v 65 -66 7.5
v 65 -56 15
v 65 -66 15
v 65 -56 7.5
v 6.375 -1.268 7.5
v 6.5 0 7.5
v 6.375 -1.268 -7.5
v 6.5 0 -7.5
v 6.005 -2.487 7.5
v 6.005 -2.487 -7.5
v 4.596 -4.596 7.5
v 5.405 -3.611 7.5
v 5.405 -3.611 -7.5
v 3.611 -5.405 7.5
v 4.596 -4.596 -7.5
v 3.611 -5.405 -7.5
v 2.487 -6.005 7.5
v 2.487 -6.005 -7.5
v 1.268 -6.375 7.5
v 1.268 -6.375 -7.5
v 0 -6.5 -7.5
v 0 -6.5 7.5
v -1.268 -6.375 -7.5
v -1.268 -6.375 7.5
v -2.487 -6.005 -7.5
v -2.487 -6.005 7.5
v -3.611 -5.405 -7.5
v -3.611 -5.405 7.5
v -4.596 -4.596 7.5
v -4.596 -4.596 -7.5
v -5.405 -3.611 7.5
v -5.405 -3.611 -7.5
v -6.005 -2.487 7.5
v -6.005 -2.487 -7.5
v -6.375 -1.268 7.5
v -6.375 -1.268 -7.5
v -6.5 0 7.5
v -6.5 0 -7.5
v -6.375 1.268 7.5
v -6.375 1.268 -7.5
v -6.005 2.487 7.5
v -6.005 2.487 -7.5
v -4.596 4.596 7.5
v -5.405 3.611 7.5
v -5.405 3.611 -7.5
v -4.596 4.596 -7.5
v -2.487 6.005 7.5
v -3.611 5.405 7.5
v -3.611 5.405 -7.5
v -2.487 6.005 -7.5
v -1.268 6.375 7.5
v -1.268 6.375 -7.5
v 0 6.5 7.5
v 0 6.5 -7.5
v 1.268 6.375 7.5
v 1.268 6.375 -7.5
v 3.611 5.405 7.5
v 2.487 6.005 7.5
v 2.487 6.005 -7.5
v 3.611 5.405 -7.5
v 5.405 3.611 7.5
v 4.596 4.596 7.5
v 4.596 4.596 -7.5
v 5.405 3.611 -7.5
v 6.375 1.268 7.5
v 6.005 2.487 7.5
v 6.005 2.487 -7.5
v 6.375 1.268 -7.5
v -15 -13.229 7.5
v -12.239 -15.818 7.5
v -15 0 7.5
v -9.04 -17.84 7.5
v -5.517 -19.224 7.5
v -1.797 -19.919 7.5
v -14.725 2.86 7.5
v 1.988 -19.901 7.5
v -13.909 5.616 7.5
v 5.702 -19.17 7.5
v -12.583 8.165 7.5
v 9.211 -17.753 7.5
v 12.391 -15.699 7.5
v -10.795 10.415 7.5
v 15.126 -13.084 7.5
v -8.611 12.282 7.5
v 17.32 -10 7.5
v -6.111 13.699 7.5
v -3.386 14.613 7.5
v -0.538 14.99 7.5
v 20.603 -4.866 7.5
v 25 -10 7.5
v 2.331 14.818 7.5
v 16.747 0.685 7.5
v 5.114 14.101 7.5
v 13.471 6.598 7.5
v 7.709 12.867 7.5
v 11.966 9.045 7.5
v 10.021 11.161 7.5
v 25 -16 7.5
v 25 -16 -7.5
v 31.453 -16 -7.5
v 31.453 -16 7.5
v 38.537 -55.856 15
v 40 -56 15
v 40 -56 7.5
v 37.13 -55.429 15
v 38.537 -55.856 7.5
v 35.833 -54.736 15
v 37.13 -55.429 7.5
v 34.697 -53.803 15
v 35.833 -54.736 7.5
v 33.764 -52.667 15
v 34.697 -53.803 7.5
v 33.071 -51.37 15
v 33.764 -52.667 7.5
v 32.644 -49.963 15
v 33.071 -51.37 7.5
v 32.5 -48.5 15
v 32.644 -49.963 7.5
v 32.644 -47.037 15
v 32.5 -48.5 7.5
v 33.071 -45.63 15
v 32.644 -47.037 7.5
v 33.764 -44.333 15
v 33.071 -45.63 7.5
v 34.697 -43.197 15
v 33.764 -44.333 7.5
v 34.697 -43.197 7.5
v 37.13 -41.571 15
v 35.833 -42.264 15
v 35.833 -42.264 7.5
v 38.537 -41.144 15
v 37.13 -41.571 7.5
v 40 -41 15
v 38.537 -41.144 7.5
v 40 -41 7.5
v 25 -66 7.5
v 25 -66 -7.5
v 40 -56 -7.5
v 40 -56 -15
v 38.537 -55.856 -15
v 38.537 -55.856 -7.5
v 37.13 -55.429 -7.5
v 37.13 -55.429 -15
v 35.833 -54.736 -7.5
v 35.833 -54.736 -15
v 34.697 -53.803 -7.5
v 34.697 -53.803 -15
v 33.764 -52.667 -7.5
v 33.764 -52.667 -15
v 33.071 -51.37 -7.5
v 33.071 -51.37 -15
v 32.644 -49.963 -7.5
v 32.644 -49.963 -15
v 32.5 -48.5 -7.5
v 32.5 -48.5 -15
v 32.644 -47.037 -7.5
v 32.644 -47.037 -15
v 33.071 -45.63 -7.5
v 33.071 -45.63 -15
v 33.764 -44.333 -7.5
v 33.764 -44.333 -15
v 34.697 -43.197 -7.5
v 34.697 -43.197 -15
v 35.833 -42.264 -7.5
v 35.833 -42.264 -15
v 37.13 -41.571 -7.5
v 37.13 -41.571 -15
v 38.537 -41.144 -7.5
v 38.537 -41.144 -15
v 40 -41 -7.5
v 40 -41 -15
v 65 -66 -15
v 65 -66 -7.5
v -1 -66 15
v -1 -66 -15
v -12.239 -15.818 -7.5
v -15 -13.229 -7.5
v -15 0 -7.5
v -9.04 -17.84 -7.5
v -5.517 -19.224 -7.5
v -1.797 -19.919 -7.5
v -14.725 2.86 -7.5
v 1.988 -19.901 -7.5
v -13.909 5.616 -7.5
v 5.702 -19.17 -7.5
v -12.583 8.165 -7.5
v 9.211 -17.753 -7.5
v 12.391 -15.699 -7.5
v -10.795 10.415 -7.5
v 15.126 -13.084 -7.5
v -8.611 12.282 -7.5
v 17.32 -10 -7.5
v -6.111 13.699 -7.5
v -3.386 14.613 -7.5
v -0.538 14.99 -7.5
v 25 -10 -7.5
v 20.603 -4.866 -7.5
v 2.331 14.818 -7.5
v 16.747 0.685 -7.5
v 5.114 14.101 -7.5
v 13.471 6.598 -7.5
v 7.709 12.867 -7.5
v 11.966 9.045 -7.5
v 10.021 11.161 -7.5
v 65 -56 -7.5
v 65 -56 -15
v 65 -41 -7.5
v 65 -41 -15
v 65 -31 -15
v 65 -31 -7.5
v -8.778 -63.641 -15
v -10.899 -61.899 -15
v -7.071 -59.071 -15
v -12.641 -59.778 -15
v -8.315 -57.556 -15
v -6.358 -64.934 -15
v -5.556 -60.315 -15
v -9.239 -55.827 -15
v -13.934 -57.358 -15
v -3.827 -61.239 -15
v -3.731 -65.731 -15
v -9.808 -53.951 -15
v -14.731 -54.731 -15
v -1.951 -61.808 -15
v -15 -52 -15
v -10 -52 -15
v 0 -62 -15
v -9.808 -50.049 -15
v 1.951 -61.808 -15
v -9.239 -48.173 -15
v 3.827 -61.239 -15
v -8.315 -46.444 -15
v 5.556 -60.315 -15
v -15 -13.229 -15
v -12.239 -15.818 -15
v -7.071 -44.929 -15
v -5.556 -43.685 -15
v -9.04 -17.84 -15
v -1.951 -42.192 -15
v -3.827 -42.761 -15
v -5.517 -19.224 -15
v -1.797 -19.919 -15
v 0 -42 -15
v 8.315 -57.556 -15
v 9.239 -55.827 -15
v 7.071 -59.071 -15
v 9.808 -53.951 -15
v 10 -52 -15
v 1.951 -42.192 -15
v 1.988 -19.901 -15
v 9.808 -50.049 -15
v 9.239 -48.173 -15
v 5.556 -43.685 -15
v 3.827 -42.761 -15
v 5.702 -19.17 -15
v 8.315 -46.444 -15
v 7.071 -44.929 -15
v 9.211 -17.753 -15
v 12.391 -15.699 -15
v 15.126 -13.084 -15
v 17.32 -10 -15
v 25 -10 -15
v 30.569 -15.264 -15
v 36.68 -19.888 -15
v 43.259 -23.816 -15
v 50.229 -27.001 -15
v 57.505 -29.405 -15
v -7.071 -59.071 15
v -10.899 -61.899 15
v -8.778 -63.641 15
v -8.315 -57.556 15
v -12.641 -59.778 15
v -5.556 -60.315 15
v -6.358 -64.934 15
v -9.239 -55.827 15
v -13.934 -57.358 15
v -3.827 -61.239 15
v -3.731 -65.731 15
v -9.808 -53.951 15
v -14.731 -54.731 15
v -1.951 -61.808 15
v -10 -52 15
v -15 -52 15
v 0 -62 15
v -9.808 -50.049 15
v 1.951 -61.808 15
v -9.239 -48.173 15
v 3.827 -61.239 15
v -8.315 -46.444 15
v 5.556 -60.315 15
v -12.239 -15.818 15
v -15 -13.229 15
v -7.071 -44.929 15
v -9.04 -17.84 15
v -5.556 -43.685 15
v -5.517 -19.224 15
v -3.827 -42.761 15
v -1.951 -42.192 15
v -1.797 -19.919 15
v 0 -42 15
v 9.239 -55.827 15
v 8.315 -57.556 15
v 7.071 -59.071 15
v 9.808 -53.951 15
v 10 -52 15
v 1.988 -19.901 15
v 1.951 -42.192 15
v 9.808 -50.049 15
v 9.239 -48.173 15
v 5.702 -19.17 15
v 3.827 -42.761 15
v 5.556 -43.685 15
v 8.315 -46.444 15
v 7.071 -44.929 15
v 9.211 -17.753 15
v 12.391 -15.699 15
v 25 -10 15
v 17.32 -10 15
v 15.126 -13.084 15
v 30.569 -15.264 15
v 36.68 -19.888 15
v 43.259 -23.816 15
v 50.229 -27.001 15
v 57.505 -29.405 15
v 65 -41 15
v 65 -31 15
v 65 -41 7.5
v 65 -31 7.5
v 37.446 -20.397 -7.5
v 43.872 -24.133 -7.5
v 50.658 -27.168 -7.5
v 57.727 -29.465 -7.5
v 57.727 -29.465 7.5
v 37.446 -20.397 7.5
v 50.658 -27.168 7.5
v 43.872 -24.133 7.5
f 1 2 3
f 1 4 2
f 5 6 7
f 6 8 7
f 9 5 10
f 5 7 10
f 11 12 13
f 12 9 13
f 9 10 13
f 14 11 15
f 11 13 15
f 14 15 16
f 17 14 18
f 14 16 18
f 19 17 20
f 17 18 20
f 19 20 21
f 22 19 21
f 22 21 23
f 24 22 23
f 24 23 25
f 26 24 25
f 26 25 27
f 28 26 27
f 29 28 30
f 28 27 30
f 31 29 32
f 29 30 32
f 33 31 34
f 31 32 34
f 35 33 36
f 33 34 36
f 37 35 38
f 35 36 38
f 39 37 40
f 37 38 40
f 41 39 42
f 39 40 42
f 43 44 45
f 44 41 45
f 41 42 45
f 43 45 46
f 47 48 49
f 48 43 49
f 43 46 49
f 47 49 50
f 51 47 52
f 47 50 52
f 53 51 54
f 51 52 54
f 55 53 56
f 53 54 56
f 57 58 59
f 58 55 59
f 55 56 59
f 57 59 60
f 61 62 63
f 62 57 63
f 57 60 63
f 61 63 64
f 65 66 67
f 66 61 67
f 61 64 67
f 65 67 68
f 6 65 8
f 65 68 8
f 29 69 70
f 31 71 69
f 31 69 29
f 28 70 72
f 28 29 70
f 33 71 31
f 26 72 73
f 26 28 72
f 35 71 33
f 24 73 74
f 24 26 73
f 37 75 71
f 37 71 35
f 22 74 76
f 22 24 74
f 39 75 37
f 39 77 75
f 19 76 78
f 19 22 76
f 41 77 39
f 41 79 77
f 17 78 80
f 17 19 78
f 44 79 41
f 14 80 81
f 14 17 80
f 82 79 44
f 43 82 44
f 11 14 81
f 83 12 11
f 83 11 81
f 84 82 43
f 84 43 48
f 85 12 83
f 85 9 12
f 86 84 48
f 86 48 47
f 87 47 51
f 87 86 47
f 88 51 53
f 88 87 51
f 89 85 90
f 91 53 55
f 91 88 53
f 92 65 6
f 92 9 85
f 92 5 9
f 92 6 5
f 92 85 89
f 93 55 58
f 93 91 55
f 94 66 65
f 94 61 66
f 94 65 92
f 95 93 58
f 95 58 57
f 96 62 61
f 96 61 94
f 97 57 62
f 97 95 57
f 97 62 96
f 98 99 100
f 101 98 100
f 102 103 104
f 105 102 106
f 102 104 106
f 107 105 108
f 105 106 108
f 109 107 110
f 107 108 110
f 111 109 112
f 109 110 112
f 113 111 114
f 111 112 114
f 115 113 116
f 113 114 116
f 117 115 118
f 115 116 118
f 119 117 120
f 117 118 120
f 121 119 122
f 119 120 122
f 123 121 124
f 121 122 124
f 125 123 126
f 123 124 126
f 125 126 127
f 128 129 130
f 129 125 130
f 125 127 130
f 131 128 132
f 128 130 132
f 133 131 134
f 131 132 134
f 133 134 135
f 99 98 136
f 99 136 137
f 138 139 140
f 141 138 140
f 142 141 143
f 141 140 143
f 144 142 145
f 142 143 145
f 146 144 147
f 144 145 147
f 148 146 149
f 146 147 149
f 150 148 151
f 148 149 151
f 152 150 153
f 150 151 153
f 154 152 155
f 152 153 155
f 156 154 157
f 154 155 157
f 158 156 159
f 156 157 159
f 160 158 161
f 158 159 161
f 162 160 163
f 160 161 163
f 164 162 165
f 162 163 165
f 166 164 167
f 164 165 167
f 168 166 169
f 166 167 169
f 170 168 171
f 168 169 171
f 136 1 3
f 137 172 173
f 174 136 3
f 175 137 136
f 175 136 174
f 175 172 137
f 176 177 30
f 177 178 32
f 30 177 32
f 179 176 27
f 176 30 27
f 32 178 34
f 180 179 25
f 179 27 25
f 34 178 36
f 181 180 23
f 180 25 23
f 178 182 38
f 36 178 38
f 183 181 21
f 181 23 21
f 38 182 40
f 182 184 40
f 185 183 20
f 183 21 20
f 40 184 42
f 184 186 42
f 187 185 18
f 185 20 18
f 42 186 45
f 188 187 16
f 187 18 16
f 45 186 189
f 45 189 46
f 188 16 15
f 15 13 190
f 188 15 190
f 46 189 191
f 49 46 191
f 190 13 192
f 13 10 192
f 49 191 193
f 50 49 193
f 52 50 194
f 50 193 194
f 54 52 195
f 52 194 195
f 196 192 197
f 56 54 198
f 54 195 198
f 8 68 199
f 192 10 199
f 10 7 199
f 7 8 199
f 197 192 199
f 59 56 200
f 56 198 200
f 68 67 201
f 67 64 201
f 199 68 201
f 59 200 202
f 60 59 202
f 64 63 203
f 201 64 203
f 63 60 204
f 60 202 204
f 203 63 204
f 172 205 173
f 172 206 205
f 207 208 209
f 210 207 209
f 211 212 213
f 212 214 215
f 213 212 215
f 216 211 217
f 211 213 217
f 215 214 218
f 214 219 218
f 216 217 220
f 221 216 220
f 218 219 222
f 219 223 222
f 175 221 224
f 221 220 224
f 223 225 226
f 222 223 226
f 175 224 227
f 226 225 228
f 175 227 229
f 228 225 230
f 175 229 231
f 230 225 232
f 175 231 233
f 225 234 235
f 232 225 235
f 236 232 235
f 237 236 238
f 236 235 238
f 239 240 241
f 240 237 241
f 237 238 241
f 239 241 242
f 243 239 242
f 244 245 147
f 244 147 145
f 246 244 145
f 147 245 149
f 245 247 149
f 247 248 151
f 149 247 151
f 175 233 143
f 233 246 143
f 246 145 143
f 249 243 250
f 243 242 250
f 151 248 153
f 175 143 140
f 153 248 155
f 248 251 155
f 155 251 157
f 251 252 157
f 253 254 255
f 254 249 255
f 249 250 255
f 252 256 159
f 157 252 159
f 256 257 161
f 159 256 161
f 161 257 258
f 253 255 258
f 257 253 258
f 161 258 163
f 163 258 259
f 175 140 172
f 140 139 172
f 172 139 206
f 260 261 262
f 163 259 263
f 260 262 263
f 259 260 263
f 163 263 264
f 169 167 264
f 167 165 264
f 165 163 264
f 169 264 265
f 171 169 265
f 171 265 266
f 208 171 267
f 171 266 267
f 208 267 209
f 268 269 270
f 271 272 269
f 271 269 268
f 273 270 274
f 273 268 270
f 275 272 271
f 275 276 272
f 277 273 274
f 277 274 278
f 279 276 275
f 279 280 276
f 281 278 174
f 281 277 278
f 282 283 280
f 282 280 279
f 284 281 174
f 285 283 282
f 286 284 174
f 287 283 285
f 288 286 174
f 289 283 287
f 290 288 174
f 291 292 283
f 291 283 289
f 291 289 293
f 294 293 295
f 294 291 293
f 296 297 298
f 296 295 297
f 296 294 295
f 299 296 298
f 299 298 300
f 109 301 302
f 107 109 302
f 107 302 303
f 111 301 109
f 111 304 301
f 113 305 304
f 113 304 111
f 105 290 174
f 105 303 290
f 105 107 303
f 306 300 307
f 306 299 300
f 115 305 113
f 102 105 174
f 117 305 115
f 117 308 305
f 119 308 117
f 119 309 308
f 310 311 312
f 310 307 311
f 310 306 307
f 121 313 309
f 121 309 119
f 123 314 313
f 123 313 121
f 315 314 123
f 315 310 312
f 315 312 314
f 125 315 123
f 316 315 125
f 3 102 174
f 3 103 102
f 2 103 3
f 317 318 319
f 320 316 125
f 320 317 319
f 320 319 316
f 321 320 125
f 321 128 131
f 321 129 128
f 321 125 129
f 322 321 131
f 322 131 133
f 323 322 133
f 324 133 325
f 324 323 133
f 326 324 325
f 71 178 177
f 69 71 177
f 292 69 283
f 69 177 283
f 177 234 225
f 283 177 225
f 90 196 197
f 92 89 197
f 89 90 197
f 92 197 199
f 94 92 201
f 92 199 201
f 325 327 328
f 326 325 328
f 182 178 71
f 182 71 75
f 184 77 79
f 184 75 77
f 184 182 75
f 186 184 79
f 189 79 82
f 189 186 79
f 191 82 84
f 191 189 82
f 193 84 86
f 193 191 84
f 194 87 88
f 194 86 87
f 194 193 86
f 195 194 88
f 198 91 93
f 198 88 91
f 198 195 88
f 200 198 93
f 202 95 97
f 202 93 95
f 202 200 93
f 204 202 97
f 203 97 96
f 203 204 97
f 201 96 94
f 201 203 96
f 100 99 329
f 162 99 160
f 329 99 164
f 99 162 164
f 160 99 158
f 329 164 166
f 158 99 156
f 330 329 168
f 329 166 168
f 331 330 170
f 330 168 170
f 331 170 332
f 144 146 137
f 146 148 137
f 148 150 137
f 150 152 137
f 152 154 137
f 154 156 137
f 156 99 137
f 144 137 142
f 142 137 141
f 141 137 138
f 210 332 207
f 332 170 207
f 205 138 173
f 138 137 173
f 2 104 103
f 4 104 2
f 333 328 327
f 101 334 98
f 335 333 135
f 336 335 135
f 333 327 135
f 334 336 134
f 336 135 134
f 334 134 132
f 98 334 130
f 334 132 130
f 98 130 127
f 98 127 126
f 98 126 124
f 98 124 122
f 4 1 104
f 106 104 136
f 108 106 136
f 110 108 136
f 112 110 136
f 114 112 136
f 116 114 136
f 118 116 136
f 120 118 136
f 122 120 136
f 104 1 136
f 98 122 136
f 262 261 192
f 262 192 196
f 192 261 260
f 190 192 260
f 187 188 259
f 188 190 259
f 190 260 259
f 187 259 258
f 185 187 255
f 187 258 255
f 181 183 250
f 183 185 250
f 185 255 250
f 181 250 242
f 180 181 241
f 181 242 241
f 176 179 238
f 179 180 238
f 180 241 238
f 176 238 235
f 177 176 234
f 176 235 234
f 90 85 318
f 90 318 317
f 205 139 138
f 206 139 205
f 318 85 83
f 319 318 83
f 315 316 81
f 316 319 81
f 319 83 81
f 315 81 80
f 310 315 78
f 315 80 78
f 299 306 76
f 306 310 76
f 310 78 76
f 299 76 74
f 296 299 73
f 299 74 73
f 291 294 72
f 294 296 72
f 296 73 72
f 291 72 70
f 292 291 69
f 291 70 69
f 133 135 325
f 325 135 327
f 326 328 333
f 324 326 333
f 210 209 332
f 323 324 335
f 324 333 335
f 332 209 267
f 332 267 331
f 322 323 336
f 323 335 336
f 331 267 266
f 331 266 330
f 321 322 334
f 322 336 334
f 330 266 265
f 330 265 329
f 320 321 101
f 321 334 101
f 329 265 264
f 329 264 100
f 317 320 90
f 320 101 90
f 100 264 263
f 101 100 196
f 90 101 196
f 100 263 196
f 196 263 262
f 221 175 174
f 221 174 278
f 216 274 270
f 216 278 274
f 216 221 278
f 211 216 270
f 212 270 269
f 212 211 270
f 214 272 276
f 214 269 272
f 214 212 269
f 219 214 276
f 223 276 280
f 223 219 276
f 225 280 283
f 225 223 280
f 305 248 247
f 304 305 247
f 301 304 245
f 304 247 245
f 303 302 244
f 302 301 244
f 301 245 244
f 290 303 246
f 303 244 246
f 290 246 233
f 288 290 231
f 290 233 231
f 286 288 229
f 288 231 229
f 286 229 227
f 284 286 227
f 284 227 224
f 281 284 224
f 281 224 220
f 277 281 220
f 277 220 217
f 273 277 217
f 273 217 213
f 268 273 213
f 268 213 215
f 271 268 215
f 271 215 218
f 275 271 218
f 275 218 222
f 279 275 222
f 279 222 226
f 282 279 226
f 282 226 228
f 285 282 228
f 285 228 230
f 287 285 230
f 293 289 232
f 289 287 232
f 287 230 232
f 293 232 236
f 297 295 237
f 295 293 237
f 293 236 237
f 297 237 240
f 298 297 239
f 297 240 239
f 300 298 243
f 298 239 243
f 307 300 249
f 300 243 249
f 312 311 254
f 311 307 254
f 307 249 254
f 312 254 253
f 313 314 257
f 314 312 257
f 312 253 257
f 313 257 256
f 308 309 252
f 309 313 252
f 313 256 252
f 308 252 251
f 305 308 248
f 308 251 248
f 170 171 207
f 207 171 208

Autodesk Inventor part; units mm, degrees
ref_plane "YZ Plane" through (0, 0, 0) normal (1, 0, 0) x (0, 1, 0)
ref_plane "XZ Plane" through (0, 0, 0) normal (0, 1, 0) x (-1, 0, 0)
ref_plane "XY Plane" through (0, 0, 0) normal (0, 0, 1) x (1, 0, 0)
sketch "Boceto1" plane through (0, 0, 0) normal (0, 0, 1) x (1, 0, 0)
  line L0 (0, 50) -> (0, -50) construction
  line L1 (-50, 0) -> (50, 0) construction
  line L2 (-50, -52) -> (50, -52) construction
  circle A0 centre (0, -52) radius 10
  circle A1 centre (0, 0) radius 6.5
  arc A2 (13.4711, 6.5977) -> (-15, 0) centre (0, 0) ccw
  arc A3 (-15, -13.2288) -> (17.3205, -10) centre (0, 0) ccw
  line L3 (17.3205, -10) -> (25, -10)
  line L4 (40, -56) -> (65, -56)
  line L5 (65, -56) -> (65, -66)
  line L6 (65, -66) -> (40, -66)
  line L7 (-15, 0) -> (-15, -66)
  line L8 (65, 25.2383) -> (65, -76.5705) construction
  line L9 (40, -66) -> (-15, -66)
  line L10 (40, -41) -> (65, -41)
  arc A4 (40, -41) -> (40, -56) centre (40, -48.5) ccw
  line L11 (65, -41) -> (65, -31)
  line L12 (25, 28.6395) -> (25, -70.532) construction
  arc A5 (25, -10) -> (65, -31) centre (75.7977, 38.1622) ccw
  arc A6 (13.4711, 6.5977) -> (25, -10) centre (73.5302, 36.0124) ccw
  point P0 (0, 0)
  point P1 (17.3859, -10)
  point P2 (65, -61)
  point P3 (40, -61)
  point P4 (52.5, -41)
  dimension "d0" = 100
  dimension "d1" = 100
  dimension "d2" = 52
  dimension "d3" = 100
  dimension "d4" = 20
  dimension "d5" = 13
  dimension "d6" = 15
  dimension "d7" = 20
  dimension "d8" = 10
  dimension "d9" = 56
  dimension "d10" = 10
  dimension "d11" = 25
  dimension "d12" = 80
  dimension "d14" = 15
  dimension "d15" = 7.5
  dimension "d16" = 7.5
  dimension "d17" = 25
  dimension "d18" = 10
  dimension "d19" = 40
  dimension "d20" = 25
  dimension "d21" = 80
  dimension "d22" = 70
  dimension "d23" = 7.6141
extrude "Extrusión1" add sketch "Boceto1" along normal mid plane 15 contours A6 L3 A3 L7 A2
extrude "Extrusión2" add sketch "Boceto1" along normal mid plane 30 contours A5 L11 L10 A4 L4 L5 L6 L9 L7 A3 L3
fillet "Empalme1" radius 14 1 edges at (-15, -66, 0)
sketch "Boceto2" plane through (65, -66, -15) normal (0, -1, 0) x (1, 0, 0)
  line L0 (0, 0) -> (0, 30) projected
  line L1 (0, 22.5) -> (-40, 22.5)
  line L2 (-40, 22.5) -> (-40, 7.5)
  line L3 (-40, 7.5) -> (0, 7.5)
  line L4 (0, 7.5) -> (0, 22.5)
  line L5 (38.7229, 15) -> (-93.8867, 15) construction
  point P0 (-65, 15)
  point P1 (0, 7.5)
  dimension "d29" = 40
  dimension "d30" = 15
  dimension "d31" = 15
  dimension "d32" = 132.6097
  dimension "d33" = 38.7229
extrude "Extrusión3" cut sketch "Boceto2" against normal blind 50
properties part number "ensayo 8" material "Acero inoxidable"
